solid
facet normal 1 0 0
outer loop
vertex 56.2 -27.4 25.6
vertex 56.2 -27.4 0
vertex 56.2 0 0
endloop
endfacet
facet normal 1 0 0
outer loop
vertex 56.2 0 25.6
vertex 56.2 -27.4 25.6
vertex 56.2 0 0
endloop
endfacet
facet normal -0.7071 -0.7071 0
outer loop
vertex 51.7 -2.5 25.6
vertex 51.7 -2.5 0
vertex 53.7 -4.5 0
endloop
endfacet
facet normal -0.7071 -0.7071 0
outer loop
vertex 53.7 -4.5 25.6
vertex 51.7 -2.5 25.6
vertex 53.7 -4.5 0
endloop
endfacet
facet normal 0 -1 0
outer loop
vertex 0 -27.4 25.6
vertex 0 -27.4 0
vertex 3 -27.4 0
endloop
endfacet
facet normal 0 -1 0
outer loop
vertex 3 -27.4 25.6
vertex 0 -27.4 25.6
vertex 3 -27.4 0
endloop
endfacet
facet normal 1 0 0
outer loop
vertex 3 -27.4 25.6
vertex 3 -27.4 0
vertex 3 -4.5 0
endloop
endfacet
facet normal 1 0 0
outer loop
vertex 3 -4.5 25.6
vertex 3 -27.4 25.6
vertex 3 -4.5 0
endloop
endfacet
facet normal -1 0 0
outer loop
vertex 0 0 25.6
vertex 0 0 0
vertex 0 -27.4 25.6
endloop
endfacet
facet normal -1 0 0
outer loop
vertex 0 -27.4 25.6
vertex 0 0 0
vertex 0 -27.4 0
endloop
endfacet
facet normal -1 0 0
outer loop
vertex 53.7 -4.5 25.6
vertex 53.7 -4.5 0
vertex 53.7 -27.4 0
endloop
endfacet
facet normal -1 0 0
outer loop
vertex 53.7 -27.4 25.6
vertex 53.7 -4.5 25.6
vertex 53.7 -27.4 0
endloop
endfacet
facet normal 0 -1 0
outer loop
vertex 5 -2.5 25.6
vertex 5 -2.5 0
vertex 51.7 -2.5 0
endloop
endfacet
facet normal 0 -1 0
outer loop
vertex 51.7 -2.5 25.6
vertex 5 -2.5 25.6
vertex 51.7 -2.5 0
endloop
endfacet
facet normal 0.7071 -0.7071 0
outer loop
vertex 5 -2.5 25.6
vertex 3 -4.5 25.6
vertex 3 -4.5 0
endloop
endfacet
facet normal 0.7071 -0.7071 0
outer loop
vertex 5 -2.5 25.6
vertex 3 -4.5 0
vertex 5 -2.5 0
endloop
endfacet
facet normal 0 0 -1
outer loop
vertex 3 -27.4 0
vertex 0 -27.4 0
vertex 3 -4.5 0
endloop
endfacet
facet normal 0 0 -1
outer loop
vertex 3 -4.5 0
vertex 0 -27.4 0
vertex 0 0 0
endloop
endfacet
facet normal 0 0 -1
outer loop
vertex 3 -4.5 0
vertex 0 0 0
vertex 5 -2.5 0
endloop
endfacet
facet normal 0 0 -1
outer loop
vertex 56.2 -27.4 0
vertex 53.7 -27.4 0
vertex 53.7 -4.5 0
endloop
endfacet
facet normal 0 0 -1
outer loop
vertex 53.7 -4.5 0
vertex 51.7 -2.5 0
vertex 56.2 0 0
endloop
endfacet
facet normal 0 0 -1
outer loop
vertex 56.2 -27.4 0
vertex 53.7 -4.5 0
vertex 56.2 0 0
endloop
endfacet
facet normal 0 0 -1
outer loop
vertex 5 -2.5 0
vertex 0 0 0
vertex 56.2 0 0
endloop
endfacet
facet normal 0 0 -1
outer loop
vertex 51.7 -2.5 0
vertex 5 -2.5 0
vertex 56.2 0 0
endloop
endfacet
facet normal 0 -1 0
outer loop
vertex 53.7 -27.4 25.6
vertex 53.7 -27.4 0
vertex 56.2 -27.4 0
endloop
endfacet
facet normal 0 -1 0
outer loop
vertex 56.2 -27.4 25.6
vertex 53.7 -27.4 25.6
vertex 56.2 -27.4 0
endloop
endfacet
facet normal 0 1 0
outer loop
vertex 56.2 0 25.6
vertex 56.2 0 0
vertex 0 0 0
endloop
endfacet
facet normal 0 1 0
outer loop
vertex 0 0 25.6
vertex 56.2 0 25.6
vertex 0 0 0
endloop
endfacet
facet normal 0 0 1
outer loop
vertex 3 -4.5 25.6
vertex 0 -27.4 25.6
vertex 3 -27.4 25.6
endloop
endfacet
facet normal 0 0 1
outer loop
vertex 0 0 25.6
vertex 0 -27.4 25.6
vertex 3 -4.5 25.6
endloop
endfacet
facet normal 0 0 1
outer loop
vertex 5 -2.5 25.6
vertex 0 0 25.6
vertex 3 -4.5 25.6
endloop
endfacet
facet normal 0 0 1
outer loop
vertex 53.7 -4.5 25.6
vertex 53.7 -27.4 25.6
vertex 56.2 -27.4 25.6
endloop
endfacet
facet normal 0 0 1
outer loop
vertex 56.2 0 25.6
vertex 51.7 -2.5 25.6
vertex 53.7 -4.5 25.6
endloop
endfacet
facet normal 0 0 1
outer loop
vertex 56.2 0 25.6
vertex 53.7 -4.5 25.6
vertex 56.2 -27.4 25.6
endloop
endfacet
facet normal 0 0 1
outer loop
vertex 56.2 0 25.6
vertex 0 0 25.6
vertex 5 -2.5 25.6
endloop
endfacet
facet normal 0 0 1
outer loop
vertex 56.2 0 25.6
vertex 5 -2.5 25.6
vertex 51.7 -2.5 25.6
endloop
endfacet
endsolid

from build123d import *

# Parameters (mm, degrees)
F1_DEPTH = 25.6


with BuildPart() as f1:
    # F0 (on Top) → F1 (new body)
    with BuildSketch(Plane.XY):
        Polygon((56.2, 0), (0, 0), (0, -27.4), (3, -27.4), (3, -4.5), (3, -2.5), (5, -2.5), (51.7, -2.5), (53.7, -2.5), (53.7, -4.5), (53.7, -27.4), (56.2, -27.4), align=None)
        Polygon((51.7, -2.5), (53.7, -4.5), (53.7, -2.5), align=None)
        Polygon((3, -2.5), (3, -4.5), (5, -2.5), align=None)
    extrude(amount=F1_DEPTH)


solid = f1.part
